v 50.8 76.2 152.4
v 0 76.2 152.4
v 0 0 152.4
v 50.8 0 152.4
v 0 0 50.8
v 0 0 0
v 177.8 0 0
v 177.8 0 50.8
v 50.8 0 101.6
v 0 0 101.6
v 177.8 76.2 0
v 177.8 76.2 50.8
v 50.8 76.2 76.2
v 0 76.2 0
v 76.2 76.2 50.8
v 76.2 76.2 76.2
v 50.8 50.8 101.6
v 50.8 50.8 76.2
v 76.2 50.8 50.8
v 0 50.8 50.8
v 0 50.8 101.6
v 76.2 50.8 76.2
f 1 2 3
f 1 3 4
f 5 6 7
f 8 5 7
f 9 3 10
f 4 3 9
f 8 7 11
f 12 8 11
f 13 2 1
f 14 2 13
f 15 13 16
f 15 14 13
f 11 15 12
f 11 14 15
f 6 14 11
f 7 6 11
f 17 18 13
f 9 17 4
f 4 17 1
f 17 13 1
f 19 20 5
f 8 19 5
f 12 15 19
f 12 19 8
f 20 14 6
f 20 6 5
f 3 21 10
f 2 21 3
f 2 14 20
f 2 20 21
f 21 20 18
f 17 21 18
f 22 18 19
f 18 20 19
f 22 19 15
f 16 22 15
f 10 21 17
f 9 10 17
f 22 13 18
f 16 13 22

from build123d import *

# Parameters (mm, degrees)
F0_W     = 177.8
F0_H     = 76.2
F1_DEPTH = 50.8
F2_W     = 76.2
F2_H     = 25.4
F3_DEPTH = 25.4
F4_W     = 50.8
F4_H     = 25.4
F5_DEPTH = 76.2
F6_W     = 50.8
F6_H     = 50.8
F7_DEPTH = 50.8


with BuildPart() as f1:
    # F0 (on Top) → F1 (new body)
    with BuildSketch(Plane.XY):
        with Locations((88.9, 38.1)):
            Rectangle(F0_W, F0_H)
    extrude(amount=F1_DEPTH)

    # F2 (on face) → F3 (join)
    with BuildSketch(Plane.XY.offset(50.8)):
        with Locations((38.1, 63.5)):
            Rectangle(F2_W, F2_H)
    extrude(amount=F3_DEPTH)

    # F4 (on face) → F5 (join)
    with BuildSketch(Plane.XY.offset(76.2)):
        with Locations((25.4, 63.5)):
            Rectangle(F4_W, F4_H)
    extrude(amount=F5_DEPTH)

    # F6 (on face) → F7 (join)
    with BuildSketch(Plane.XZ.offset(-50.8)):
        with Locations((25.4, 127)):
            Rectangle(F6_W, F6_H)
    extrude(amount=F7_DEPTH)


solid = f1.part
